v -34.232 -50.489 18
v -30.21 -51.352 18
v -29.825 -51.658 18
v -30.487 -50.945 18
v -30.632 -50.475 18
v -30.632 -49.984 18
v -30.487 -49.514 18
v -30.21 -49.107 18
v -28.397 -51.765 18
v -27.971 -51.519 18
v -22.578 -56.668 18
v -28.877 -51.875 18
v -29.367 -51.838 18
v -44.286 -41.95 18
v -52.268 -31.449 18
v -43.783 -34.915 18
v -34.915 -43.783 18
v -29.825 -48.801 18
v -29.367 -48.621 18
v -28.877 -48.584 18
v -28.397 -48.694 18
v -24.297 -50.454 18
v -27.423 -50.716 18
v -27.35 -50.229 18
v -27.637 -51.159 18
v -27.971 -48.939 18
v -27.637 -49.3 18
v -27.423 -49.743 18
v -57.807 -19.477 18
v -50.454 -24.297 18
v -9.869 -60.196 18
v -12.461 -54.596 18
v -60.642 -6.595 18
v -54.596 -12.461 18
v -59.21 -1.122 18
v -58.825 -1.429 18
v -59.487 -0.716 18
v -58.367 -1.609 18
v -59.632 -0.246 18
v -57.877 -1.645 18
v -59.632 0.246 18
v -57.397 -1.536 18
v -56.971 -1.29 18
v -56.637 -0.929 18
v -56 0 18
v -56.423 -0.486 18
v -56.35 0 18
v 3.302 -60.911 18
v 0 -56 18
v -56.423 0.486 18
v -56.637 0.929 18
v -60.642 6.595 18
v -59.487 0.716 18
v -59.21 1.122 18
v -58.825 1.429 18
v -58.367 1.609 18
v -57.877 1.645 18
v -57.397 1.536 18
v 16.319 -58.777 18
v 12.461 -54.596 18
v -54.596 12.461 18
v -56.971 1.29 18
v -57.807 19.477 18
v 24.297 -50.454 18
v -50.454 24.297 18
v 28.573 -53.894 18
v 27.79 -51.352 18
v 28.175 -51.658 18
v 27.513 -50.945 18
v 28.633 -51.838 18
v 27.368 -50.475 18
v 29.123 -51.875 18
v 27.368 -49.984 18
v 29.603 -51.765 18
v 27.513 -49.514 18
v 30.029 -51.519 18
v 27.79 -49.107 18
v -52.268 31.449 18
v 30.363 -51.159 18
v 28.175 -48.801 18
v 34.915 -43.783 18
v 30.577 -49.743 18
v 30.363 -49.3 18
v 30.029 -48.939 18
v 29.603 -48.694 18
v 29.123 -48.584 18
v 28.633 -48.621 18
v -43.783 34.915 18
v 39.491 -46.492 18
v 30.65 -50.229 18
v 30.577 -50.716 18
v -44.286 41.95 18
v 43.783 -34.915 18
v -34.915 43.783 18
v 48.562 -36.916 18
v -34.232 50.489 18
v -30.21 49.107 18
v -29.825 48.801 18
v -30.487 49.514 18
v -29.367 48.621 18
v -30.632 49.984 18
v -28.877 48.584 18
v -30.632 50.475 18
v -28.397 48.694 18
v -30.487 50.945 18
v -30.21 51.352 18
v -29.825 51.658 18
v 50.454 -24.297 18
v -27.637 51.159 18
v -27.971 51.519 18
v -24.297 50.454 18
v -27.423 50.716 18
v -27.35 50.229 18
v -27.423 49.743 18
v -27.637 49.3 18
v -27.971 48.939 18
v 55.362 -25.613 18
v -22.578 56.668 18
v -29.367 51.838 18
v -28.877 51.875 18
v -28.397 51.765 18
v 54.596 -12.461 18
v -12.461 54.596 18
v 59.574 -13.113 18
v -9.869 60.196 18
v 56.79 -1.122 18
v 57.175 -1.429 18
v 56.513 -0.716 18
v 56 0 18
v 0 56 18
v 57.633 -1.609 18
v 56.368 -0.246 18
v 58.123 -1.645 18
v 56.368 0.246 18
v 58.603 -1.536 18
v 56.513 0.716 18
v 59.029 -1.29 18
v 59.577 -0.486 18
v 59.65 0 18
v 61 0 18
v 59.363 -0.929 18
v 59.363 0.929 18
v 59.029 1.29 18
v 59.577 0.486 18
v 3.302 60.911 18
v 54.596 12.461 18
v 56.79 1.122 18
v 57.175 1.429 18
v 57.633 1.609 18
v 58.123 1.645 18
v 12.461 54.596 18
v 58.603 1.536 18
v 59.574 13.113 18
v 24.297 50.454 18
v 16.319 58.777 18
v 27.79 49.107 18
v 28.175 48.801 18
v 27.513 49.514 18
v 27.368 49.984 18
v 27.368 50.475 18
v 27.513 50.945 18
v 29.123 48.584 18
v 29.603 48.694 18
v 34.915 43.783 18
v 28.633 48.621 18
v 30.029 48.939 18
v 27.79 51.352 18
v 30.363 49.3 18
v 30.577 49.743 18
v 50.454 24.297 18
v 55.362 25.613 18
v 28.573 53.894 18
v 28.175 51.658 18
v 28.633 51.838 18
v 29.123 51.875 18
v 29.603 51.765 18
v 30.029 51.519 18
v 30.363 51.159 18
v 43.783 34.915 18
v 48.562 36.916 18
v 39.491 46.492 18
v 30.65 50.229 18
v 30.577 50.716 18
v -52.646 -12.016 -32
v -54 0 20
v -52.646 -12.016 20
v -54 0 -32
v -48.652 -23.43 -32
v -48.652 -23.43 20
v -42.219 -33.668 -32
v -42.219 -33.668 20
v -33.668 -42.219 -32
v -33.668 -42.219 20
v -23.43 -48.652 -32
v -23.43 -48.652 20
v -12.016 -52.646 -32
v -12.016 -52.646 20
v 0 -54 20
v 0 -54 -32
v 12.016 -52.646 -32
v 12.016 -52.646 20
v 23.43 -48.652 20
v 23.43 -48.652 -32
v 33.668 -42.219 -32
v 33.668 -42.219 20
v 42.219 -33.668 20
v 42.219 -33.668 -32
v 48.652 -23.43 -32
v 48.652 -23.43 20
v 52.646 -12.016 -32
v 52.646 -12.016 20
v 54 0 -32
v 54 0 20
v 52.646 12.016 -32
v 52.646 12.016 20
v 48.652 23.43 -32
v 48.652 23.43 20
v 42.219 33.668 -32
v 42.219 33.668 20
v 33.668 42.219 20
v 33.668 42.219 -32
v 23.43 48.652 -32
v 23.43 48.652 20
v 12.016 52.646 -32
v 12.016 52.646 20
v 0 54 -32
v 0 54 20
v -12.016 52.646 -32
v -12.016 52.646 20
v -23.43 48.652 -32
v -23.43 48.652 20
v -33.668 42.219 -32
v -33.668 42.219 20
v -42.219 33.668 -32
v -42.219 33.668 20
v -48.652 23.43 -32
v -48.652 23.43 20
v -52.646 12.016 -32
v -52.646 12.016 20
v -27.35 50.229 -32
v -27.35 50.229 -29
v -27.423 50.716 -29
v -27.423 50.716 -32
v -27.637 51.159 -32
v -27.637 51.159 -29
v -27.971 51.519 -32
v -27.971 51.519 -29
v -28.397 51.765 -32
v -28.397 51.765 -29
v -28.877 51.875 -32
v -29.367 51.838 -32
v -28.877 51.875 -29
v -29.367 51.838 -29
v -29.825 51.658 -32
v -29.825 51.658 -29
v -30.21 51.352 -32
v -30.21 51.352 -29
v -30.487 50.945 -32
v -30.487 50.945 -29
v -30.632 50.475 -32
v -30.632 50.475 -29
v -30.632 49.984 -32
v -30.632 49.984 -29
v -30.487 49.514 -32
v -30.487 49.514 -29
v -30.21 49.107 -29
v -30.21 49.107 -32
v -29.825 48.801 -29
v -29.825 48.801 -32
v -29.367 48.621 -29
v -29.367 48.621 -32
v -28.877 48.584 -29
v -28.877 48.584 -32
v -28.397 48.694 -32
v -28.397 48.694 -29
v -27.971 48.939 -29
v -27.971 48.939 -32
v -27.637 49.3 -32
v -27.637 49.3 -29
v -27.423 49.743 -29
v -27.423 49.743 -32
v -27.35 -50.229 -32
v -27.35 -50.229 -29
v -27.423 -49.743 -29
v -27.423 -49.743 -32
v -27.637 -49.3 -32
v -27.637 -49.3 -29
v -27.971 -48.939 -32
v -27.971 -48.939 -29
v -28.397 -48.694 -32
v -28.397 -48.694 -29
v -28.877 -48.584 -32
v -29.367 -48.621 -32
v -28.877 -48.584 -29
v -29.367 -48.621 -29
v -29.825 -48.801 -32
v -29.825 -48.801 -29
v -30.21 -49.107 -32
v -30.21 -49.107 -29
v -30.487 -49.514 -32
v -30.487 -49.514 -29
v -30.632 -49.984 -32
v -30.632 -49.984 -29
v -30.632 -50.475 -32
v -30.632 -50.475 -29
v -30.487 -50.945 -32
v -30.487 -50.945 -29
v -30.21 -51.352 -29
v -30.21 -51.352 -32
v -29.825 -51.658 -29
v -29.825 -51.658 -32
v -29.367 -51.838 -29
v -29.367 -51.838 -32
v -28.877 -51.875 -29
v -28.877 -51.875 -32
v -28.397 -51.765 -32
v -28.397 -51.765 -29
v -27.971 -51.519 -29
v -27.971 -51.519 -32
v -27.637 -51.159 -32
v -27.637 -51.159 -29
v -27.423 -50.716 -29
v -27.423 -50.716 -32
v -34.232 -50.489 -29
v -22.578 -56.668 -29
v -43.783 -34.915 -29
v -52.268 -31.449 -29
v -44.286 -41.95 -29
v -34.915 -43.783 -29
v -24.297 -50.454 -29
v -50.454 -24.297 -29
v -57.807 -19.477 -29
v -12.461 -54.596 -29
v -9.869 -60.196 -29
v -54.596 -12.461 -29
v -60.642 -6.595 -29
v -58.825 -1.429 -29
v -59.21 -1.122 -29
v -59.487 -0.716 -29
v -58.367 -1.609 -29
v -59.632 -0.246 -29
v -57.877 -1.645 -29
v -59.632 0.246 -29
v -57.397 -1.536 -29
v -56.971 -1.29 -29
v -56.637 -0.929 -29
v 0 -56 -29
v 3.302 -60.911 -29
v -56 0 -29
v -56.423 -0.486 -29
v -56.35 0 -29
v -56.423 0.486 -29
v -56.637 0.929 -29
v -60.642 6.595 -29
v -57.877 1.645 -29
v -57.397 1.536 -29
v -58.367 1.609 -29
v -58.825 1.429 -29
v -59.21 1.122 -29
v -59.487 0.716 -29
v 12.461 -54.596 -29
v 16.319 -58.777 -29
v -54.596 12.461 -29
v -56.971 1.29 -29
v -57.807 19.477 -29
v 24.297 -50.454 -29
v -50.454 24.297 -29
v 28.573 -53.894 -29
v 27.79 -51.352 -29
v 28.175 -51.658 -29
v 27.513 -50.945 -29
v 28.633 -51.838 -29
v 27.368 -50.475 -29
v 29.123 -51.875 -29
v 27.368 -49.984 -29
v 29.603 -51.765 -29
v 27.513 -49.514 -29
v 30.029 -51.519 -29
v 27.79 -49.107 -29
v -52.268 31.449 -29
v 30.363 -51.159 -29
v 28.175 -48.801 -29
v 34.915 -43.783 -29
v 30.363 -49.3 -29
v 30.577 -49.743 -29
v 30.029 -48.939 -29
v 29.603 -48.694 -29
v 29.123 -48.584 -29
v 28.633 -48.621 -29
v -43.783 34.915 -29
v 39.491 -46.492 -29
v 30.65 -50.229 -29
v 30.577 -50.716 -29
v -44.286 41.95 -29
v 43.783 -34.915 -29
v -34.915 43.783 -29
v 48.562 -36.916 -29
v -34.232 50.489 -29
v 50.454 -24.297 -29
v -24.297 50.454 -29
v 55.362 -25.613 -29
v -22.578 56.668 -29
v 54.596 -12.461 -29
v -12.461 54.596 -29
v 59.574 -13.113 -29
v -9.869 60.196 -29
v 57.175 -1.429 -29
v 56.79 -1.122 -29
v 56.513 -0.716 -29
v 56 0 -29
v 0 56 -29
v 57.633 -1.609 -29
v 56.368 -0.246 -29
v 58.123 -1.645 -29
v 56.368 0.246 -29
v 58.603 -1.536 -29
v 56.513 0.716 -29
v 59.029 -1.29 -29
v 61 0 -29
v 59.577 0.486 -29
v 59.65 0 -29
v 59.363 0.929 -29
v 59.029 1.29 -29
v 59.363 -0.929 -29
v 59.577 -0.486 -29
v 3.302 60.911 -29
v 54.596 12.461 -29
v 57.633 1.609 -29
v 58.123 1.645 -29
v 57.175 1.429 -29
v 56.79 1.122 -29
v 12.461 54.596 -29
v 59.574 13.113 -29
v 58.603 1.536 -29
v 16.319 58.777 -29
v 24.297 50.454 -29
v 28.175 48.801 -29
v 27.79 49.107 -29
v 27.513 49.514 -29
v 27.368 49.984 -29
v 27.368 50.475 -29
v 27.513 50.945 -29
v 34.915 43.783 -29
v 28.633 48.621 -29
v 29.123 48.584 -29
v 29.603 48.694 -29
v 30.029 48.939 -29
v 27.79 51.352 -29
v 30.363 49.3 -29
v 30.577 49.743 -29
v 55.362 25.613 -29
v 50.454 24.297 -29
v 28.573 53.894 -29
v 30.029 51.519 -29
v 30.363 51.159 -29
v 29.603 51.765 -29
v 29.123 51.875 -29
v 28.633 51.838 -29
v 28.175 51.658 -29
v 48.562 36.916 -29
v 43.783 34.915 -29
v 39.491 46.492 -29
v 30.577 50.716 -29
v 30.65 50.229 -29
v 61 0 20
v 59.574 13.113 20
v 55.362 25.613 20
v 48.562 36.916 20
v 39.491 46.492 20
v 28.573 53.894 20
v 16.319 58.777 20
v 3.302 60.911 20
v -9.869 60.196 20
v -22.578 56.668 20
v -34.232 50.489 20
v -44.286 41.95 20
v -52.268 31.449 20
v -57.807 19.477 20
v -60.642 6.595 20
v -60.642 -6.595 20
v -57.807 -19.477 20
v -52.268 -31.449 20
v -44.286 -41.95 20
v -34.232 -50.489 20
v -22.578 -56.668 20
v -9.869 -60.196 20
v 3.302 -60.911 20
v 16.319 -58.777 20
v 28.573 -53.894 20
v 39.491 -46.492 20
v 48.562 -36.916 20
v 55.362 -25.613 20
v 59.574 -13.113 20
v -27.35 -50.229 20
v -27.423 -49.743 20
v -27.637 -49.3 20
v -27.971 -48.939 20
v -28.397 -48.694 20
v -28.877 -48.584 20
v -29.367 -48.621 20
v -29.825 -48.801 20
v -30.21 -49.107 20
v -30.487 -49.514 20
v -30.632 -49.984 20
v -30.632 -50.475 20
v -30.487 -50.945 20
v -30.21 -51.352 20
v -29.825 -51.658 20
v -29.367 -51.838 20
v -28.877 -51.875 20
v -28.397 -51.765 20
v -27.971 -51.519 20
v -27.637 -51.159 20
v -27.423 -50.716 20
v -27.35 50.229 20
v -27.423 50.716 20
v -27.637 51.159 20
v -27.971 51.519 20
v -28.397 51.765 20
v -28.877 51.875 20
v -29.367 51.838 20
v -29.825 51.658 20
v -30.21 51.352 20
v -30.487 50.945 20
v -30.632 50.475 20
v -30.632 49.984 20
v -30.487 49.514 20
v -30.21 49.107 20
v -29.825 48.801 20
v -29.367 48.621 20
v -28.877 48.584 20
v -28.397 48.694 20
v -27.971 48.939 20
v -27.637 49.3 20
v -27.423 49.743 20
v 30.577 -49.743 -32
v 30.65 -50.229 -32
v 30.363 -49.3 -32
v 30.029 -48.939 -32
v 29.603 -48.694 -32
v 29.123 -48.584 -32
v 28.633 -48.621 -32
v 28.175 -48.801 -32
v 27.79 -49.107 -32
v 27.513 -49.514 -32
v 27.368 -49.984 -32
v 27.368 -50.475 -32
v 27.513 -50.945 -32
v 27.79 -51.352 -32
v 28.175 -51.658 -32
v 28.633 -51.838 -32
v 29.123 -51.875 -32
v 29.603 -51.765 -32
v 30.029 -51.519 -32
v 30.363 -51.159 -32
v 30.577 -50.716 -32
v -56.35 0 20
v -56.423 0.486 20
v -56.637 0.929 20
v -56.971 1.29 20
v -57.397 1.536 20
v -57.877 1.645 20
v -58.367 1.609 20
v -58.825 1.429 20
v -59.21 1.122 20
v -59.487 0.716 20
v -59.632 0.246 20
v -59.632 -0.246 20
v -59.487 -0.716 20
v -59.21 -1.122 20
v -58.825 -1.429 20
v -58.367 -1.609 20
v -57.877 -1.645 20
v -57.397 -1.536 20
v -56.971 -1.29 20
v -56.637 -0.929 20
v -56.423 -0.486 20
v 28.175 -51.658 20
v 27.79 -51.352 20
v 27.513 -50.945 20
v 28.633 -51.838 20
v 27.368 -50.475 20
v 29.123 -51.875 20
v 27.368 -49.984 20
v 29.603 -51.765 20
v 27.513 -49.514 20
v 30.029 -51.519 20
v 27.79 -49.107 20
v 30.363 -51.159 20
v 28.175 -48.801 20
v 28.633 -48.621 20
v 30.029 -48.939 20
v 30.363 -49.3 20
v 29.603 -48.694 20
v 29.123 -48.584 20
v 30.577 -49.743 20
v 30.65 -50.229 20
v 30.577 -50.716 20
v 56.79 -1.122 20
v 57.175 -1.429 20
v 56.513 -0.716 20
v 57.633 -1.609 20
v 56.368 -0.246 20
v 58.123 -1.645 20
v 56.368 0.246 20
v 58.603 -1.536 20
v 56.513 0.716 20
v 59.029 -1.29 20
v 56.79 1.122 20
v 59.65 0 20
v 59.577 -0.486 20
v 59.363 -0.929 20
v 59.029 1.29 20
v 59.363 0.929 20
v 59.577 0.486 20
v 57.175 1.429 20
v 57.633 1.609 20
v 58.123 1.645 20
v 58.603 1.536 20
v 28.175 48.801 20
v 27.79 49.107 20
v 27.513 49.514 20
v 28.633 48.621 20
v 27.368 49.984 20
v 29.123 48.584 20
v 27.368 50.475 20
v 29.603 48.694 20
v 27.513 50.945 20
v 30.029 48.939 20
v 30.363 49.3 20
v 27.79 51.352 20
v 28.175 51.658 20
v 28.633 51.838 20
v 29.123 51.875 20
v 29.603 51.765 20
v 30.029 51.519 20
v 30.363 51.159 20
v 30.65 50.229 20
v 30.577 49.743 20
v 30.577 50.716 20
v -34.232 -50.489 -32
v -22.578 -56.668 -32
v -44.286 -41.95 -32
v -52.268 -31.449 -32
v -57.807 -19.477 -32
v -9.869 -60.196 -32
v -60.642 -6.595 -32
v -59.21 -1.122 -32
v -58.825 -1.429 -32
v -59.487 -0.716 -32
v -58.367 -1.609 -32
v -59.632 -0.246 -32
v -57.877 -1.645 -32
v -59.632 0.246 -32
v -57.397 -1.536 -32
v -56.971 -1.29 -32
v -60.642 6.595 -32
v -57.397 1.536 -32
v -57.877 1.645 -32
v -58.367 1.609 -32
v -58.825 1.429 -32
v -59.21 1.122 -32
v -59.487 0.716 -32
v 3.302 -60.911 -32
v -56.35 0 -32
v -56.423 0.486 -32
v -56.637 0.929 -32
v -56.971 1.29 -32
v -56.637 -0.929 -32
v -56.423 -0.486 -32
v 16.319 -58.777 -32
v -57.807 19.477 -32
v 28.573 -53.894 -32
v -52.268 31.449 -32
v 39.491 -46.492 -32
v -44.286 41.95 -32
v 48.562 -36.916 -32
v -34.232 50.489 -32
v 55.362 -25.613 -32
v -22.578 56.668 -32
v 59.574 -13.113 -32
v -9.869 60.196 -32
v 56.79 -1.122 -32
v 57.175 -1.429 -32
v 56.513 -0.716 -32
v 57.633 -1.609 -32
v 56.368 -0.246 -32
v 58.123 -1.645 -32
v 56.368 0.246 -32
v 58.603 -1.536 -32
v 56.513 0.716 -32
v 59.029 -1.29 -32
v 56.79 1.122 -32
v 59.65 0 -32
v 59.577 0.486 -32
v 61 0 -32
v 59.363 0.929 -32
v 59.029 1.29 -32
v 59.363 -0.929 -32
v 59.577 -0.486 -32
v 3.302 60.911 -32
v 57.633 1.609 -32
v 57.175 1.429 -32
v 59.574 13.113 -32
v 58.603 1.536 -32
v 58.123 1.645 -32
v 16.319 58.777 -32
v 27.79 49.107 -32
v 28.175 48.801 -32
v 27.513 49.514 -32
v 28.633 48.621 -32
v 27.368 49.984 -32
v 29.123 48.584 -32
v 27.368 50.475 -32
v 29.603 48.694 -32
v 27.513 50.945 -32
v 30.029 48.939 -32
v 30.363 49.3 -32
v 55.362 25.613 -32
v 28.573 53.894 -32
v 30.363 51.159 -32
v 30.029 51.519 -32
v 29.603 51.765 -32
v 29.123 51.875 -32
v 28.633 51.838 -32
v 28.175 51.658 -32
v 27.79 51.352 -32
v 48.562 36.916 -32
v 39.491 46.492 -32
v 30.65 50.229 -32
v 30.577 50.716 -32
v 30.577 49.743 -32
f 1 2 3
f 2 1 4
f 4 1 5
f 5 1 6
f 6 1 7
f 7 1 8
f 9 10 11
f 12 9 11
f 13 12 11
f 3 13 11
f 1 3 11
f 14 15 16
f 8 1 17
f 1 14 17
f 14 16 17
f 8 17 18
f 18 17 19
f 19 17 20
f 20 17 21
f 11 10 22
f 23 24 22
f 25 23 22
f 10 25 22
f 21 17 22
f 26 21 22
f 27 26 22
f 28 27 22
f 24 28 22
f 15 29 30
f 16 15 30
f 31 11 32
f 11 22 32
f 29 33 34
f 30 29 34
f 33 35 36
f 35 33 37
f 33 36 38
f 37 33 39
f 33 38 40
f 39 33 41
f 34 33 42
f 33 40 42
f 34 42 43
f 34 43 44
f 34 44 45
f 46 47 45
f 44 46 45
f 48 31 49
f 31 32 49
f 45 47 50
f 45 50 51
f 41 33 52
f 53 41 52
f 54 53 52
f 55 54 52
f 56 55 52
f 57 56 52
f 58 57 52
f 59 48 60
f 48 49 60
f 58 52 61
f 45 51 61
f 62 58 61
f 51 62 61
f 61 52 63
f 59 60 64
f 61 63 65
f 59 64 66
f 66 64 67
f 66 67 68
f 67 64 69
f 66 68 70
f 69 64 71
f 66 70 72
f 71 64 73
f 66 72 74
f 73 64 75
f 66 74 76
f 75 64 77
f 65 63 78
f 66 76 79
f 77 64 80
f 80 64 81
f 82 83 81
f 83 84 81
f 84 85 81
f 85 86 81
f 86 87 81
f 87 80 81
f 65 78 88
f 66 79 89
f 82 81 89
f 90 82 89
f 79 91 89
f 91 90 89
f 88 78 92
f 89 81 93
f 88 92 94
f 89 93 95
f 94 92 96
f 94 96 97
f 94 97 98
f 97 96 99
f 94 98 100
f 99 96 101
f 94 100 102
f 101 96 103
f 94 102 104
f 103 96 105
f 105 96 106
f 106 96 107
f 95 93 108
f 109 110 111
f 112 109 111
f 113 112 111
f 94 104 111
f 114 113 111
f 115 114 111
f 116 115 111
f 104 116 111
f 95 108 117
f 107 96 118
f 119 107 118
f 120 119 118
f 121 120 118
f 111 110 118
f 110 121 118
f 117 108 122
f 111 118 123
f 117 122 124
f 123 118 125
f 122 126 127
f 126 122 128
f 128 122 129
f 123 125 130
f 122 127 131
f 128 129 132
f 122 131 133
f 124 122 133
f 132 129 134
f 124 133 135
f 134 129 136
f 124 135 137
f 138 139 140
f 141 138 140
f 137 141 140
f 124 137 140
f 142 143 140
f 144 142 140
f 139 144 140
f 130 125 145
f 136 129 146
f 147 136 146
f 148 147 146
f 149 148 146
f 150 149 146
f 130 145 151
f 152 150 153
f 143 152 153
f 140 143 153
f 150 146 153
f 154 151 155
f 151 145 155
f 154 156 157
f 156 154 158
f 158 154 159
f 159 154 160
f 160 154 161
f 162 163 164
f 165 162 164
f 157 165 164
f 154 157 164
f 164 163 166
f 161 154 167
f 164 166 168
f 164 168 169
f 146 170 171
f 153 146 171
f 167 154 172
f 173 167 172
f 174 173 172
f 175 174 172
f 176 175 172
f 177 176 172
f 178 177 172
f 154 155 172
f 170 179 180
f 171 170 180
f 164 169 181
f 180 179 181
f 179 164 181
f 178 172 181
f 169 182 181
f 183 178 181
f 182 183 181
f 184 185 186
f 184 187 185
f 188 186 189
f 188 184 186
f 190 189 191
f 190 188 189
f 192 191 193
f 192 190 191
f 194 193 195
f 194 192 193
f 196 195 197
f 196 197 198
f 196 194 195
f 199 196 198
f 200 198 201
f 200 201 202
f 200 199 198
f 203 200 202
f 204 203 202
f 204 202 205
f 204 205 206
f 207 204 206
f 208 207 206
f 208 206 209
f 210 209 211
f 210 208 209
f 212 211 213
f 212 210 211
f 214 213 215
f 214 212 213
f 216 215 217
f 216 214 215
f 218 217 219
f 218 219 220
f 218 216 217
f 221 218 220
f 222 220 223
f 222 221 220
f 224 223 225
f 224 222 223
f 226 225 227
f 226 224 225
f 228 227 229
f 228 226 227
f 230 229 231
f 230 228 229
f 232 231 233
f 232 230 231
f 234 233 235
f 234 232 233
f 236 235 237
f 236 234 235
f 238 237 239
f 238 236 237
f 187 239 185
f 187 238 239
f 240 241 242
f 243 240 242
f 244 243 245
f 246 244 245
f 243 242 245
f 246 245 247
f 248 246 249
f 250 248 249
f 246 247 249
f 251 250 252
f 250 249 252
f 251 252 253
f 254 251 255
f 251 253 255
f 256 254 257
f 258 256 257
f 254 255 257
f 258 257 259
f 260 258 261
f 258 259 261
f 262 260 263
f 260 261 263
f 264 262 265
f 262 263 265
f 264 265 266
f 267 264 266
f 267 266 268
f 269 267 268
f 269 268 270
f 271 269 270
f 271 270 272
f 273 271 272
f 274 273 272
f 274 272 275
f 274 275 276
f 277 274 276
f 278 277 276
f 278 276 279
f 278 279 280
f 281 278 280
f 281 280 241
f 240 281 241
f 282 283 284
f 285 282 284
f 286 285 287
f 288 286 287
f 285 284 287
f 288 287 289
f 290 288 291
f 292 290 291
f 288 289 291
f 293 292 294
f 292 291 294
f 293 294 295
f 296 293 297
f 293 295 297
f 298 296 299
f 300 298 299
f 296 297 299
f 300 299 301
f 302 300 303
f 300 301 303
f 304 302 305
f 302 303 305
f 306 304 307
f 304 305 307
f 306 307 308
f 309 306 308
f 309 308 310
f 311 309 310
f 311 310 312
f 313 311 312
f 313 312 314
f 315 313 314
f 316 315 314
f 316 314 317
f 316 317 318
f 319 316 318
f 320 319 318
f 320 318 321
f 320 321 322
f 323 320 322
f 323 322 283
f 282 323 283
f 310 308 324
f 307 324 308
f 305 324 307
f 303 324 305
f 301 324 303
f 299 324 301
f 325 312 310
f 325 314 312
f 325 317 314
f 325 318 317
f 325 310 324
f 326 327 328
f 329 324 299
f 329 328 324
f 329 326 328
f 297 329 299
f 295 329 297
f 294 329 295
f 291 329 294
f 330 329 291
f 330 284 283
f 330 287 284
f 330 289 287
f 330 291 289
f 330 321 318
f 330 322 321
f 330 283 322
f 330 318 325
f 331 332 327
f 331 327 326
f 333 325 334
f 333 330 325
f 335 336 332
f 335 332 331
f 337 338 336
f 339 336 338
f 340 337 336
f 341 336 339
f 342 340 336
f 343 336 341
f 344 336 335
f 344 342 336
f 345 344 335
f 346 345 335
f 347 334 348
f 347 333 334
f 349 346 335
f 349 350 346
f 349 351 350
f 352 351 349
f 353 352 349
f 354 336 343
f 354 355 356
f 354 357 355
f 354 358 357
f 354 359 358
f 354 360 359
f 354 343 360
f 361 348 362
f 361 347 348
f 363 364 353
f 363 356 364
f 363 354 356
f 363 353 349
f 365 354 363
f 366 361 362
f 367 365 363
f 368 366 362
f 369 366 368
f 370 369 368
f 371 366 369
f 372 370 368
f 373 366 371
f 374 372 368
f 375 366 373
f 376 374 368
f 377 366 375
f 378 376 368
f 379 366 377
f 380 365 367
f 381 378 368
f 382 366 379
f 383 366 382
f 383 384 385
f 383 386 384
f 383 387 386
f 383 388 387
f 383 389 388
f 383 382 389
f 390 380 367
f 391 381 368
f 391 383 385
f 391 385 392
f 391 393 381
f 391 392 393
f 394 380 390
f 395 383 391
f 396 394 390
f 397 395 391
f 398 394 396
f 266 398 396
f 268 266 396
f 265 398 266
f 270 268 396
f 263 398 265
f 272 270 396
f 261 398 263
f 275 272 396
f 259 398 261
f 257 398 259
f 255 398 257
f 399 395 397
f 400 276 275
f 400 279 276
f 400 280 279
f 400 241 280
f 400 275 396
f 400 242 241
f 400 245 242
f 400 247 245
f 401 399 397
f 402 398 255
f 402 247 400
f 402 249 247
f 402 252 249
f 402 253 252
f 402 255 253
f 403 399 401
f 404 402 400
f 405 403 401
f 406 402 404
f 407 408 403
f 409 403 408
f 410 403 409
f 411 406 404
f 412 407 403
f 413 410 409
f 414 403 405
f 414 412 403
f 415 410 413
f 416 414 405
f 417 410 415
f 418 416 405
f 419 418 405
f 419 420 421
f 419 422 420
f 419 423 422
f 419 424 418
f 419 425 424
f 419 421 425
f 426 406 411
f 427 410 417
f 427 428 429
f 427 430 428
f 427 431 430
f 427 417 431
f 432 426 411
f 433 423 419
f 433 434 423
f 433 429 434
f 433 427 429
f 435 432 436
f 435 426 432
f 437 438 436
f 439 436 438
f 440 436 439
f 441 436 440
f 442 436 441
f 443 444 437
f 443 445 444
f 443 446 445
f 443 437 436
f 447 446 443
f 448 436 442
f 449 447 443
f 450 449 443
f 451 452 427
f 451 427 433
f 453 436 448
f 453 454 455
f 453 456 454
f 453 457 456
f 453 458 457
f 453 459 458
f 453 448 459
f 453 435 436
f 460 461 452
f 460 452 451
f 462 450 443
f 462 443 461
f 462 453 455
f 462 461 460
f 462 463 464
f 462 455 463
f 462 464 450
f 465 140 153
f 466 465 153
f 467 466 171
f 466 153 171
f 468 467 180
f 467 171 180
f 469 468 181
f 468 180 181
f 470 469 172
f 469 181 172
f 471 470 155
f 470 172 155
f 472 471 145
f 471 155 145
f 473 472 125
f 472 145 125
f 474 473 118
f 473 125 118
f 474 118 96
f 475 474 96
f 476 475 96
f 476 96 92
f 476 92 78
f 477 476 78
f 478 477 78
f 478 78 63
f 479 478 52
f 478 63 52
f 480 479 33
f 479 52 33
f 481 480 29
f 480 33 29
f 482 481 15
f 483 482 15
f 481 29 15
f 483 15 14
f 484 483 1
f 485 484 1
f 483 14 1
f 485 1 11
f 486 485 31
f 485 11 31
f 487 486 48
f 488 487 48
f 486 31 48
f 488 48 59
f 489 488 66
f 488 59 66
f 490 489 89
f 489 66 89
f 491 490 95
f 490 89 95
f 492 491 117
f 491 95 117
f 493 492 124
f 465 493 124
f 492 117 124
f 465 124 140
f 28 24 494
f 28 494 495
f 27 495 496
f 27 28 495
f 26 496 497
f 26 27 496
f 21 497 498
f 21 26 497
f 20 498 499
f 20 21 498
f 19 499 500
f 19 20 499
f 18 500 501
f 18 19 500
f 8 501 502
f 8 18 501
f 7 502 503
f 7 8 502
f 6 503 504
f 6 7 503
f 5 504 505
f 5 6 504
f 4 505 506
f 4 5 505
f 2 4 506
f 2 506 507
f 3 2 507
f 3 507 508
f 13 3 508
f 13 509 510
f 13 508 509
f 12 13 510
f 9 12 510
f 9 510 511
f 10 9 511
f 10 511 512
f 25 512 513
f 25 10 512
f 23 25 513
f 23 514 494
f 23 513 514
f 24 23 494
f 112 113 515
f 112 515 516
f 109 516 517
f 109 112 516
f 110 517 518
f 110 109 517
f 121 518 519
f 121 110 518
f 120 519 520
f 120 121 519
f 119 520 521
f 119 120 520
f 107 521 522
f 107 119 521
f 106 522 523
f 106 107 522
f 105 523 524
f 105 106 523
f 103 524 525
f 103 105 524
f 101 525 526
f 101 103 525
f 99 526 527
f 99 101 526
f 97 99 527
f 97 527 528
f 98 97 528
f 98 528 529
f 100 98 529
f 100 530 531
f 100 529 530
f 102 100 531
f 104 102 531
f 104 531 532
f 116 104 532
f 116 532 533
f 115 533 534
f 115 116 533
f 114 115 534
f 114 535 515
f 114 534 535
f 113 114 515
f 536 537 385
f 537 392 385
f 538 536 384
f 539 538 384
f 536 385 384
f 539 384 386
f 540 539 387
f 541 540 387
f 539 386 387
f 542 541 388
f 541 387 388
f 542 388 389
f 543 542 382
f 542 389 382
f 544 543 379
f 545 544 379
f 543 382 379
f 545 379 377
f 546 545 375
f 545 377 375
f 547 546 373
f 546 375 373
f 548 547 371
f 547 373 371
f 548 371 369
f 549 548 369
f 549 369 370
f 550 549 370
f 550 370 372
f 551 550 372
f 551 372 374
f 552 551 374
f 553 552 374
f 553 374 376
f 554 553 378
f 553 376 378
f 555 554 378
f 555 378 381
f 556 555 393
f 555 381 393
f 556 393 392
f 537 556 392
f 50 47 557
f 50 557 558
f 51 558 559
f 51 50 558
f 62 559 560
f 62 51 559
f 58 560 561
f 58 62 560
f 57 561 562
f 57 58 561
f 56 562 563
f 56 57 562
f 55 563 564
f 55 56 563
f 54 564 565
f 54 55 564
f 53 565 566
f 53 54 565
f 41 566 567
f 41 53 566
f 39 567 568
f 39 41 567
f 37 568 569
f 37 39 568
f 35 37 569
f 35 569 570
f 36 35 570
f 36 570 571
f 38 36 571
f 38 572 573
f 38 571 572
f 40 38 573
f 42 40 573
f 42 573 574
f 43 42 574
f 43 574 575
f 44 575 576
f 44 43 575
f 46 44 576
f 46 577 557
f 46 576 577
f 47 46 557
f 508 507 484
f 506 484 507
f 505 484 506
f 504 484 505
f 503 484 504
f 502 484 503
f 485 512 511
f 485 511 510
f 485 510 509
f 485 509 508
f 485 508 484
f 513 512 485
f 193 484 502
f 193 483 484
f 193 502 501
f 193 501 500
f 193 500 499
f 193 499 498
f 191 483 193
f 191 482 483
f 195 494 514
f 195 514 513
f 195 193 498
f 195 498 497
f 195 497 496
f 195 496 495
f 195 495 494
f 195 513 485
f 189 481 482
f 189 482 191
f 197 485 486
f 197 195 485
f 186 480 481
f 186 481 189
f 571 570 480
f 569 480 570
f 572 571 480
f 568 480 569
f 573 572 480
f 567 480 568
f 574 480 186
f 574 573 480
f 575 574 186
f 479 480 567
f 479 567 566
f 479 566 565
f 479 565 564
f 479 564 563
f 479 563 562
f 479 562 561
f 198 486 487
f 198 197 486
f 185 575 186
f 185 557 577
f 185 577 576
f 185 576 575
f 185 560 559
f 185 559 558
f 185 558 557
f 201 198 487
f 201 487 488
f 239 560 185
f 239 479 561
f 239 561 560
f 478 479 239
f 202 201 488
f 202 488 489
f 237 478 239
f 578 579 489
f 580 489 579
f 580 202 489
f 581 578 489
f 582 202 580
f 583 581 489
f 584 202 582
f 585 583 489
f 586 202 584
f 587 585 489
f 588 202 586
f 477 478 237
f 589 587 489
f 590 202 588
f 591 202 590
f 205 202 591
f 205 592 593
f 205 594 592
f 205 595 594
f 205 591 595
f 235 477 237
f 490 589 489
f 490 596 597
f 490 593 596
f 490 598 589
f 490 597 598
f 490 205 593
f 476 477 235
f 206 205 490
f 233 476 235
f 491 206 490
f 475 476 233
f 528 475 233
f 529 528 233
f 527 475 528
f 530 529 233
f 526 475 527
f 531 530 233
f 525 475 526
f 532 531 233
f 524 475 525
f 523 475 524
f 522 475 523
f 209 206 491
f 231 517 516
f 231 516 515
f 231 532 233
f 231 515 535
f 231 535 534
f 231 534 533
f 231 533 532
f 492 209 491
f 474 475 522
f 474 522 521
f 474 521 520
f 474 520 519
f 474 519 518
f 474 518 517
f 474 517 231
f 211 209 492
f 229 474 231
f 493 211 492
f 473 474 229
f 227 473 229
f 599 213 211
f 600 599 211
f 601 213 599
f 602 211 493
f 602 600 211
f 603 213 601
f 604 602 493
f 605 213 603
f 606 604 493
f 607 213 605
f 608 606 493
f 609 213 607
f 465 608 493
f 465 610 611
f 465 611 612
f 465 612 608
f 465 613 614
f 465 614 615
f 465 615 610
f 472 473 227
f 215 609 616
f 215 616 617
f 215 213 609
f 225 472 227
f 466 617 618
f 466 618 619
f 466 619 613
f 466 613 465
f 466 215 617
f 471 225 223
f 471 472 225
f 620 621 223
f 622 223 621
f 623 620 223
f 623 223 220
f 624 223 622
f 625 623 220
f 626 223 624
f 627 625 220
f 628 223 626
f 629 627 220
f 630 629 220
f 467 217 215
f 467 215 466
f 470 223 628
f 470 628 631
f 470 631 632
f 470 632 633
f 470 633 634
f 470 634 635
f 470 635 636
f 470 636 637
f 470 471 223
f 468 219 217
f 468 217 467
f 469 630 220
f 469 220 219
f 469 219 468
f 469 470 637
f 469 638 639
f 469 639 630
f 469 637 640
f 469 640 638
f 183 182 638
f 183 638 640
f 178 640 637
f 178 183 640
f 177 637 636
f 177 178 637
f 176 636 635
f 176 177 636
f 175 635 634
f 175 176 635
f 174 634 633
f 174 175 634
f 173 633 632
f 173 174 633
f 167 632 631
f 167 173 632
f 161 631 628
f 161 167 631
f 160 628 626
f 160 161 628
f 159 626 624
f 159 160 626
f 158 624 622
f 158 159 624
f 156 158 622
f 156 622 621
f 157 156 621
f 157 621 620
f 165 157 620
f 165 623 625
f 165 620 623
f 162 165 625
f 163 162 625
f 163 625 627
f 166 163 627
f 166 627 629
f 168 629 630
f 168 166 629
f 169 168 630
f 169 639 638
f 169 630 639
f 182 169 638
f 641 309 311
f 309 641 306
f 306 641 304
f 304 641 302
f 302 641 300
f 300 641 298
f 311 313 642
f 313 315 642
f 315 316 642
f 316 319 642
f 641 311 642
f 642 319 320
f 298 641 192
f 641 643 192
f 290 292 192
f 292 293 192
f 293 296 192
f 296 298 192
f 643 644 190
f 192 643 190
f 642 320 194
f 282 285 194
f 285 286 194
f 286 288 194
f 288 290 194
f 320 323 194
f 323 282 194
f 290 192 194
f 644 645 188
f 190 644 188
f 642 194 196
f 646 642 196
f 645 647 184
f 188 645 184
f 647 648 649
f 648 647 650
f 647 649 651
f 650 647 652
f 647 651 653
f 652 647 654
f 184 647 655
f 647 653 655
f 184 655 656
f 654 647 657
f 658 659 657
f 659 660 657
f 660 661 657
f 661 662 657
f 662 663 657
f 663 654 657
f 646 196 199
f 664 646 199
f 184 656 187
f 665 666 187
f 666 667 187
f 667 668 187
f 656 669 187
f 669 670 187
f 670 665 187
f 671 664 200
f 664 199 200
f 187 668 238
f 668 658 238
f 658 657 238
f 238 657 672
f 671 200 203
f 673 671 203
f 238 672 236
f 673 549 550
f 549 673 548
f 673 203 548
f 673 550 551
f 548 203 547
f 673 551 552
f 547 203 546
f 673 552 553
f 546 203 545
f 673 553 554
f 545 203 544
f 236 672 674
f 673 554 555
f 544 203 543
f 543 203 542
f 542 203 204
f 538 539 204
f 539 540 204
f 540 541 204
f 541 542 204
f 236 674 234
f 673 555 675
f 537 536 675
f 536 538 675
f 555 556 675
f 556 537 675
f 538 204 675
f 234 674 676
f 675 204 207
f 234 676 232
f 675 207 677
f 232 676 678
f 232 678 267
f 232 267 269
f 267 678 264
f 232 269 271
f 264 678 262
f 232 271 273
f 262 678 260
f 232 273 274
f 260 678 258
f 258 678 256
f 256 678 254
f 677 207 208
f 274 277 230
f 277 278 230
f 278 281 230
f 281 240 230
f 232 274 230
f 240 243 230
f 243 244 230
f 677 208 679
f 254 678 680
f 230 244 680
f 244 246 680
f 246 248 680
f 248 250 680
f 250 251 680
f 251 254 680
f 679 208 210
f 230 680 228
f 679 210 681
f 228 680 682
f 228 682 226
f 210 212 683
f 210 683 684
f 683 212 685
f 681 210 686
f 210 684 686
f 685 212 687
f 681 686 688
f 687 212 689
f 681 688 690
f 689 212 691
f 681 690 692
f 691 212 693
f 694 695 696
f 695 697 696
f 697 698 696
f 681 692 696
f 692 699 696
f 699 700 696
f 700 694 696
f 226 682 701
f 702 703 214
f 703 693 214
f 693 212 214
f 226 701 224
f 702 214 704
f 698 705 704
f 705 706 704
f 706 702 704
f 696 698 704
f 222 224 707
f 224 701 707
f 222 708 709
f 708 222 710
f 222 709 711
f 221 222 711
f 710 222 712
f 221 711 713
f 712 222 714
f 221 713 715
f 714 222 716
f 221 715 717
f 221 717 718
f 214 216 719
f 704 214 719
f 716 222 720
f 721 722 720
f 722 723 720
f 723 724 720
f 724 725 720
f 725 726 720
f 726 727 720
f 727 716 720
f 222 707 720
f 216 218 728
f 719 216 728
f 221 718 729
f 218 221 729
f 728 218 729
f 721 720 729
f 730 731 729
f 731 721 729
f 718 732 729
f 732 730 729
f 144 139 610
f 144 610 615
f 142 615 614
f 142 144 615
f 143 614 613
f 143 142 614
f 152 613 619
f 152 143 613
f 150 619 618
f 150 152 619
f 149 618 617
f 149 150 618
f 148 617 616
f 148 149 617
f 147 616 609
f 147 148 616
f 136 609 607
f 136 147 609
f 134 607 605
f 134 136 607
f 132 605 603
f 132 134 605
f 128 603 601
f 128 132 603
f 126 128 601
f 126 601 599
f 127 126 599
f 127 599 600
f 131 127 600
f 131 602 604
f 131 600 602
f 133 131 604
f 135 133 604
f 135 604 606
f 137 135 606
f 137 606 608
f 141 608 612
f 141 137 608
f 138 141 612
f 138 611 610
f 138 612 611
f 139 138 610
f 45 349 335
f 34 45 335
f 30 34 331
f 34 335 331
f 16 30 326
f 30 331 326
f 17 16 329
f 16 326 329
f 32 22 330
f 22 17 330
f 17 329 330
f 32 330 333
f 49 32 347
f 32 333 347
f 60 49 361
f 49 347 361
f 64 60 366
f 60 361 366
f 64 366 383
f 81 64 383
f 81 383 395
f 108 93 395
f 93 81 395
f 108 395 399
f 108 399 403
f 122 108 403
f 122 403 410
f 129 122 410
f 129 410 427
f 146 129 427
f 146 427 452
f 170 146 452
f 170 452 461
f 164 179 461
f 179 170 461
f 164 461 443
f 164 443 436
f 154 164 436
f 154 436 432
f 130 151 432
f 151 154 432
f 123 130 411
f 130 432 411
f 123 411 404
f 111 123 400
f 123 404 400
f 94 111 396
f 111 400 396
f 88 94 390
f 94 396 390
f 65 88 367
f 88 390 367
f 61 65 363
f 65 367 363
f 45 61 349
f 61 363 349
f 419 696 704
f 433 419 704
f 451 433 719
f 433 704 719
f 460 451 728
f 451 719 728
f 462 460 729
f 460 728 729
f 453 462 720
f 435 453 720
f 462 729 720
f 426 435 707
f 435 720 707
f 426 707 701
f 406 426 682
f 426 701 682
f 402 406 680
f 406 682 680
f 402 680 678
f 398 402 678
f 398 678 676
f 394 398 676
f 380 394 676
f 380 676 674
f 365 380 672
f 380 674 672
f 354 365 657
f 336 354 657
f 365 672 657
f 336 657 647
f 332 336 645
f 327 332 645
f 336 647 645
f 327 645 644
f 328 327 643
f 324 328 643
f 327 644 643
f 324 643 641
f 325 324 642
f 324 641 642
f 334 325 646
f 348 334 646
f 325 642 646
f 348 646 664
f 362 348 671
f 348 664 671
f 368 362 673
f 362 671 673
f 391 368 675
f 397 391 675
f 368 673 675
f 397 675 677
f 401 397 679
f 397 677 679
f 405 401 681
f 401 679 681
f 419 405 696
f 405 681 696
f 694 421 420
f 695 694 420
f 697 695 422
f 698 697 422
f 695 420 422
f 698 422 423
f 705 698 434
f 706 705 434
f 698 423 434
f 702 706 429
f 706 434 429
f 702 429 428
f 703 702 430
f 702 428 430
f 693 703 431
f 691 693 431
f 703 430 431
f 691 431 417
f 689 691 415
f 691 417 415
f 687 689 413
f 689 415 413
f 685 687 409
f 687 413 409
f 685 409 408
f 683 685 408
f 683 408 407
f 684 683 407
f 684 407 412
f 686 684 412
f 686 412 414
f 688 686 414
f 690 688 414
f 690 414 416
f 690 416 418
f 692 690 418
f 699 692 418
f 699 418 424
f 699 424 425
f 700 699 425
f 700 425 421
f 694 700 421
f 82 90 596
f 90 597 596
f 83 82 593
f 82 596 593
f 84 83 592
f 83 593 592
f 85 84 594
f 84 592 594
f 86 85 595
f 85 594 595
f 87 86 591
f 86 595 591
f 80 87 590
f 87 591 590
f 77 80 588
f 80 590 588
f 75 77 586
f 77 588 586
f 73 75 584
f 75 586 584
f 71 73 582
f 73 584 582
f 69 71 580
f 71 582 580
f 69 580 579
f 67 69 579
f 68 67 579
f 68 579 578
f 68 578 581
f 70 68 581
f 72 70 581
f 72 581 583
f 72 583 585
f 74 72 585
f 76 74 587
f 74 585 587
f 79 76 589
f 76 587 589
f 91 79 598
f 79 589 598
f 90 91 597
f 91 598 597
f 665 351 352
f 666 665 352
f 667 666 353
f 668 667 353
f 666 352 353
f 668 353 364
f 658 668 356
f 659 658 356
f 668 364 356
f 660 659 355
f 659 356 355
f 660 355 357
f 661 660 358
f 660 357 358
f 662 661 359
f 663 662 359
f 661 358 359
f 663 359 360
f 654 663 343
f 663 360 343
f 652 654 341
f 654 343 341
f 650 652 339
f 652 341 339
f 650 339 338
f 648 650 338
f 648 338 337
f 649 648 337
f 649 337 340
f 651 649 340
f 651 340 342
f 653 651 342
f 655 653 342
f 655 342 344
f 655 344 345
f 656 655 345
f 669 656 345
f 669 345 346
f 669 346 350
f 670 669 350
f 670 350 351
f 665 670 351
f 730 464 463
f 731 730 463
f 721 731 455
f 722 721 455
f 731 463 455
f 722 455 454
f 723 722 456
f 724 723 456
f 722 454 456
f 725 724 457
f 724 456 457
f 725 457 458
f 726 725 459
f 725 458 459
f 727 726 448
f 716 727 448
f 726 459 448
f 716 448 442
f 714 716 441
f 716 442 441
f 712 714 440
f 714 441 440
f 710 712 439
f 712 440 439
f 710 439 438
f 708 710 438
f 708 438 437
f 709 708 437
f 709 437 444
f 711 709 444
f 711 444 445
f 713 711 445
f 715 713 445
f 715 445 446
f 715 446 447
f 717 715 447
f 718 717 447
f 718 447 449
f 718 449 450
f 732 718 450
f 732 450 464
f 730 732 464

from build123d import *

# Parameters (mm, degrees)
JACKET_START        = -32
SKETCH_1_R          = 56
SKETCH_1_R_2        = 54
JACKET_DEPTH        = 52
REAR_FLANGE_START   = -32
SKETCH_2_R          = 61
SKETCH_2_R_2        = 54
REAR_FLANGE_DEPTH   = 3
FRONT_FLANGE_START  = 18
SKETCH_3_R          = 61
SKETCH_3_R_2        = 54
FRONT_FLANGE_DEPTH  = 2
SKETCH_4_R          = 1.65
THROUGH_HOLES_DEPTH = 100


with BuildPart() as part:
    # Эскиз1 → Jacket (new body)
    with BuildSketch(Plane.XY.offset(JACKET_START)):
        with Locations(Location((0, 0, 0), (0, 0, 180))):
            Circle(SKETCH_1_R)
        with Locations(Location((0, 0, 0), (0, 0, 180))):
            Circle(SKETCH_1_R_2, mode=Mode.SUBTRACT)
    extrude(amount=JACKET_DEPTH)

    # Эскиз2 → Rear_flange (add)
    with BuildSketch(Plane.XY.offset(REAR_FLANGE_START)):
        Circle(SKETCH_2_R)
        with Locations(Location((0, 0, 0), (0, 0, 180))):
            Circle(SKETCH_2_R_2, mode=Mode.SUBTRACT)
    extrude(amount=REAR_FLANGE_DEPTH)

    # Эскиз3 → Front_flange (add)
    with BuildSketch(Plane.XY.offset(FRONT_FLANGE_START)):
        Circle(SKETCH_3_R)
        with Locations(Location((0, 0, 0), (0, 0, 180))):
            Circle(SKETCH_3_R_2, mode=Mode.SUBTRACT)
    extrude(amount=FRONT_FLANGE_DEPTH)

    # Эскиз4 → Through_holes (cut, symmetric)
    with BuildSketch(Plane.XY):
        with Locations((58, 0)):
            Circle(SKETCH_4_R)
        with Locations((29, 50.229473419)):
            Circle(SKETCH_4_R)
        with Locations((-29, 50.229473419)):
            Circle(SKETCH_4_R)
        with Locations((-58, 0)):
            Circle(SKETCH_4_R)
        with Locations((-29, -50.229473419)):
            Circle(SKETCH_4_R)
        with Locations((29, -50.229473419)):
            Circle(SKETCH_4_R)
    extrude(amount=THROUGH_HOLES_DEPTH, both=True, mode=Mode.SUBTRACT)


solid = part.part
